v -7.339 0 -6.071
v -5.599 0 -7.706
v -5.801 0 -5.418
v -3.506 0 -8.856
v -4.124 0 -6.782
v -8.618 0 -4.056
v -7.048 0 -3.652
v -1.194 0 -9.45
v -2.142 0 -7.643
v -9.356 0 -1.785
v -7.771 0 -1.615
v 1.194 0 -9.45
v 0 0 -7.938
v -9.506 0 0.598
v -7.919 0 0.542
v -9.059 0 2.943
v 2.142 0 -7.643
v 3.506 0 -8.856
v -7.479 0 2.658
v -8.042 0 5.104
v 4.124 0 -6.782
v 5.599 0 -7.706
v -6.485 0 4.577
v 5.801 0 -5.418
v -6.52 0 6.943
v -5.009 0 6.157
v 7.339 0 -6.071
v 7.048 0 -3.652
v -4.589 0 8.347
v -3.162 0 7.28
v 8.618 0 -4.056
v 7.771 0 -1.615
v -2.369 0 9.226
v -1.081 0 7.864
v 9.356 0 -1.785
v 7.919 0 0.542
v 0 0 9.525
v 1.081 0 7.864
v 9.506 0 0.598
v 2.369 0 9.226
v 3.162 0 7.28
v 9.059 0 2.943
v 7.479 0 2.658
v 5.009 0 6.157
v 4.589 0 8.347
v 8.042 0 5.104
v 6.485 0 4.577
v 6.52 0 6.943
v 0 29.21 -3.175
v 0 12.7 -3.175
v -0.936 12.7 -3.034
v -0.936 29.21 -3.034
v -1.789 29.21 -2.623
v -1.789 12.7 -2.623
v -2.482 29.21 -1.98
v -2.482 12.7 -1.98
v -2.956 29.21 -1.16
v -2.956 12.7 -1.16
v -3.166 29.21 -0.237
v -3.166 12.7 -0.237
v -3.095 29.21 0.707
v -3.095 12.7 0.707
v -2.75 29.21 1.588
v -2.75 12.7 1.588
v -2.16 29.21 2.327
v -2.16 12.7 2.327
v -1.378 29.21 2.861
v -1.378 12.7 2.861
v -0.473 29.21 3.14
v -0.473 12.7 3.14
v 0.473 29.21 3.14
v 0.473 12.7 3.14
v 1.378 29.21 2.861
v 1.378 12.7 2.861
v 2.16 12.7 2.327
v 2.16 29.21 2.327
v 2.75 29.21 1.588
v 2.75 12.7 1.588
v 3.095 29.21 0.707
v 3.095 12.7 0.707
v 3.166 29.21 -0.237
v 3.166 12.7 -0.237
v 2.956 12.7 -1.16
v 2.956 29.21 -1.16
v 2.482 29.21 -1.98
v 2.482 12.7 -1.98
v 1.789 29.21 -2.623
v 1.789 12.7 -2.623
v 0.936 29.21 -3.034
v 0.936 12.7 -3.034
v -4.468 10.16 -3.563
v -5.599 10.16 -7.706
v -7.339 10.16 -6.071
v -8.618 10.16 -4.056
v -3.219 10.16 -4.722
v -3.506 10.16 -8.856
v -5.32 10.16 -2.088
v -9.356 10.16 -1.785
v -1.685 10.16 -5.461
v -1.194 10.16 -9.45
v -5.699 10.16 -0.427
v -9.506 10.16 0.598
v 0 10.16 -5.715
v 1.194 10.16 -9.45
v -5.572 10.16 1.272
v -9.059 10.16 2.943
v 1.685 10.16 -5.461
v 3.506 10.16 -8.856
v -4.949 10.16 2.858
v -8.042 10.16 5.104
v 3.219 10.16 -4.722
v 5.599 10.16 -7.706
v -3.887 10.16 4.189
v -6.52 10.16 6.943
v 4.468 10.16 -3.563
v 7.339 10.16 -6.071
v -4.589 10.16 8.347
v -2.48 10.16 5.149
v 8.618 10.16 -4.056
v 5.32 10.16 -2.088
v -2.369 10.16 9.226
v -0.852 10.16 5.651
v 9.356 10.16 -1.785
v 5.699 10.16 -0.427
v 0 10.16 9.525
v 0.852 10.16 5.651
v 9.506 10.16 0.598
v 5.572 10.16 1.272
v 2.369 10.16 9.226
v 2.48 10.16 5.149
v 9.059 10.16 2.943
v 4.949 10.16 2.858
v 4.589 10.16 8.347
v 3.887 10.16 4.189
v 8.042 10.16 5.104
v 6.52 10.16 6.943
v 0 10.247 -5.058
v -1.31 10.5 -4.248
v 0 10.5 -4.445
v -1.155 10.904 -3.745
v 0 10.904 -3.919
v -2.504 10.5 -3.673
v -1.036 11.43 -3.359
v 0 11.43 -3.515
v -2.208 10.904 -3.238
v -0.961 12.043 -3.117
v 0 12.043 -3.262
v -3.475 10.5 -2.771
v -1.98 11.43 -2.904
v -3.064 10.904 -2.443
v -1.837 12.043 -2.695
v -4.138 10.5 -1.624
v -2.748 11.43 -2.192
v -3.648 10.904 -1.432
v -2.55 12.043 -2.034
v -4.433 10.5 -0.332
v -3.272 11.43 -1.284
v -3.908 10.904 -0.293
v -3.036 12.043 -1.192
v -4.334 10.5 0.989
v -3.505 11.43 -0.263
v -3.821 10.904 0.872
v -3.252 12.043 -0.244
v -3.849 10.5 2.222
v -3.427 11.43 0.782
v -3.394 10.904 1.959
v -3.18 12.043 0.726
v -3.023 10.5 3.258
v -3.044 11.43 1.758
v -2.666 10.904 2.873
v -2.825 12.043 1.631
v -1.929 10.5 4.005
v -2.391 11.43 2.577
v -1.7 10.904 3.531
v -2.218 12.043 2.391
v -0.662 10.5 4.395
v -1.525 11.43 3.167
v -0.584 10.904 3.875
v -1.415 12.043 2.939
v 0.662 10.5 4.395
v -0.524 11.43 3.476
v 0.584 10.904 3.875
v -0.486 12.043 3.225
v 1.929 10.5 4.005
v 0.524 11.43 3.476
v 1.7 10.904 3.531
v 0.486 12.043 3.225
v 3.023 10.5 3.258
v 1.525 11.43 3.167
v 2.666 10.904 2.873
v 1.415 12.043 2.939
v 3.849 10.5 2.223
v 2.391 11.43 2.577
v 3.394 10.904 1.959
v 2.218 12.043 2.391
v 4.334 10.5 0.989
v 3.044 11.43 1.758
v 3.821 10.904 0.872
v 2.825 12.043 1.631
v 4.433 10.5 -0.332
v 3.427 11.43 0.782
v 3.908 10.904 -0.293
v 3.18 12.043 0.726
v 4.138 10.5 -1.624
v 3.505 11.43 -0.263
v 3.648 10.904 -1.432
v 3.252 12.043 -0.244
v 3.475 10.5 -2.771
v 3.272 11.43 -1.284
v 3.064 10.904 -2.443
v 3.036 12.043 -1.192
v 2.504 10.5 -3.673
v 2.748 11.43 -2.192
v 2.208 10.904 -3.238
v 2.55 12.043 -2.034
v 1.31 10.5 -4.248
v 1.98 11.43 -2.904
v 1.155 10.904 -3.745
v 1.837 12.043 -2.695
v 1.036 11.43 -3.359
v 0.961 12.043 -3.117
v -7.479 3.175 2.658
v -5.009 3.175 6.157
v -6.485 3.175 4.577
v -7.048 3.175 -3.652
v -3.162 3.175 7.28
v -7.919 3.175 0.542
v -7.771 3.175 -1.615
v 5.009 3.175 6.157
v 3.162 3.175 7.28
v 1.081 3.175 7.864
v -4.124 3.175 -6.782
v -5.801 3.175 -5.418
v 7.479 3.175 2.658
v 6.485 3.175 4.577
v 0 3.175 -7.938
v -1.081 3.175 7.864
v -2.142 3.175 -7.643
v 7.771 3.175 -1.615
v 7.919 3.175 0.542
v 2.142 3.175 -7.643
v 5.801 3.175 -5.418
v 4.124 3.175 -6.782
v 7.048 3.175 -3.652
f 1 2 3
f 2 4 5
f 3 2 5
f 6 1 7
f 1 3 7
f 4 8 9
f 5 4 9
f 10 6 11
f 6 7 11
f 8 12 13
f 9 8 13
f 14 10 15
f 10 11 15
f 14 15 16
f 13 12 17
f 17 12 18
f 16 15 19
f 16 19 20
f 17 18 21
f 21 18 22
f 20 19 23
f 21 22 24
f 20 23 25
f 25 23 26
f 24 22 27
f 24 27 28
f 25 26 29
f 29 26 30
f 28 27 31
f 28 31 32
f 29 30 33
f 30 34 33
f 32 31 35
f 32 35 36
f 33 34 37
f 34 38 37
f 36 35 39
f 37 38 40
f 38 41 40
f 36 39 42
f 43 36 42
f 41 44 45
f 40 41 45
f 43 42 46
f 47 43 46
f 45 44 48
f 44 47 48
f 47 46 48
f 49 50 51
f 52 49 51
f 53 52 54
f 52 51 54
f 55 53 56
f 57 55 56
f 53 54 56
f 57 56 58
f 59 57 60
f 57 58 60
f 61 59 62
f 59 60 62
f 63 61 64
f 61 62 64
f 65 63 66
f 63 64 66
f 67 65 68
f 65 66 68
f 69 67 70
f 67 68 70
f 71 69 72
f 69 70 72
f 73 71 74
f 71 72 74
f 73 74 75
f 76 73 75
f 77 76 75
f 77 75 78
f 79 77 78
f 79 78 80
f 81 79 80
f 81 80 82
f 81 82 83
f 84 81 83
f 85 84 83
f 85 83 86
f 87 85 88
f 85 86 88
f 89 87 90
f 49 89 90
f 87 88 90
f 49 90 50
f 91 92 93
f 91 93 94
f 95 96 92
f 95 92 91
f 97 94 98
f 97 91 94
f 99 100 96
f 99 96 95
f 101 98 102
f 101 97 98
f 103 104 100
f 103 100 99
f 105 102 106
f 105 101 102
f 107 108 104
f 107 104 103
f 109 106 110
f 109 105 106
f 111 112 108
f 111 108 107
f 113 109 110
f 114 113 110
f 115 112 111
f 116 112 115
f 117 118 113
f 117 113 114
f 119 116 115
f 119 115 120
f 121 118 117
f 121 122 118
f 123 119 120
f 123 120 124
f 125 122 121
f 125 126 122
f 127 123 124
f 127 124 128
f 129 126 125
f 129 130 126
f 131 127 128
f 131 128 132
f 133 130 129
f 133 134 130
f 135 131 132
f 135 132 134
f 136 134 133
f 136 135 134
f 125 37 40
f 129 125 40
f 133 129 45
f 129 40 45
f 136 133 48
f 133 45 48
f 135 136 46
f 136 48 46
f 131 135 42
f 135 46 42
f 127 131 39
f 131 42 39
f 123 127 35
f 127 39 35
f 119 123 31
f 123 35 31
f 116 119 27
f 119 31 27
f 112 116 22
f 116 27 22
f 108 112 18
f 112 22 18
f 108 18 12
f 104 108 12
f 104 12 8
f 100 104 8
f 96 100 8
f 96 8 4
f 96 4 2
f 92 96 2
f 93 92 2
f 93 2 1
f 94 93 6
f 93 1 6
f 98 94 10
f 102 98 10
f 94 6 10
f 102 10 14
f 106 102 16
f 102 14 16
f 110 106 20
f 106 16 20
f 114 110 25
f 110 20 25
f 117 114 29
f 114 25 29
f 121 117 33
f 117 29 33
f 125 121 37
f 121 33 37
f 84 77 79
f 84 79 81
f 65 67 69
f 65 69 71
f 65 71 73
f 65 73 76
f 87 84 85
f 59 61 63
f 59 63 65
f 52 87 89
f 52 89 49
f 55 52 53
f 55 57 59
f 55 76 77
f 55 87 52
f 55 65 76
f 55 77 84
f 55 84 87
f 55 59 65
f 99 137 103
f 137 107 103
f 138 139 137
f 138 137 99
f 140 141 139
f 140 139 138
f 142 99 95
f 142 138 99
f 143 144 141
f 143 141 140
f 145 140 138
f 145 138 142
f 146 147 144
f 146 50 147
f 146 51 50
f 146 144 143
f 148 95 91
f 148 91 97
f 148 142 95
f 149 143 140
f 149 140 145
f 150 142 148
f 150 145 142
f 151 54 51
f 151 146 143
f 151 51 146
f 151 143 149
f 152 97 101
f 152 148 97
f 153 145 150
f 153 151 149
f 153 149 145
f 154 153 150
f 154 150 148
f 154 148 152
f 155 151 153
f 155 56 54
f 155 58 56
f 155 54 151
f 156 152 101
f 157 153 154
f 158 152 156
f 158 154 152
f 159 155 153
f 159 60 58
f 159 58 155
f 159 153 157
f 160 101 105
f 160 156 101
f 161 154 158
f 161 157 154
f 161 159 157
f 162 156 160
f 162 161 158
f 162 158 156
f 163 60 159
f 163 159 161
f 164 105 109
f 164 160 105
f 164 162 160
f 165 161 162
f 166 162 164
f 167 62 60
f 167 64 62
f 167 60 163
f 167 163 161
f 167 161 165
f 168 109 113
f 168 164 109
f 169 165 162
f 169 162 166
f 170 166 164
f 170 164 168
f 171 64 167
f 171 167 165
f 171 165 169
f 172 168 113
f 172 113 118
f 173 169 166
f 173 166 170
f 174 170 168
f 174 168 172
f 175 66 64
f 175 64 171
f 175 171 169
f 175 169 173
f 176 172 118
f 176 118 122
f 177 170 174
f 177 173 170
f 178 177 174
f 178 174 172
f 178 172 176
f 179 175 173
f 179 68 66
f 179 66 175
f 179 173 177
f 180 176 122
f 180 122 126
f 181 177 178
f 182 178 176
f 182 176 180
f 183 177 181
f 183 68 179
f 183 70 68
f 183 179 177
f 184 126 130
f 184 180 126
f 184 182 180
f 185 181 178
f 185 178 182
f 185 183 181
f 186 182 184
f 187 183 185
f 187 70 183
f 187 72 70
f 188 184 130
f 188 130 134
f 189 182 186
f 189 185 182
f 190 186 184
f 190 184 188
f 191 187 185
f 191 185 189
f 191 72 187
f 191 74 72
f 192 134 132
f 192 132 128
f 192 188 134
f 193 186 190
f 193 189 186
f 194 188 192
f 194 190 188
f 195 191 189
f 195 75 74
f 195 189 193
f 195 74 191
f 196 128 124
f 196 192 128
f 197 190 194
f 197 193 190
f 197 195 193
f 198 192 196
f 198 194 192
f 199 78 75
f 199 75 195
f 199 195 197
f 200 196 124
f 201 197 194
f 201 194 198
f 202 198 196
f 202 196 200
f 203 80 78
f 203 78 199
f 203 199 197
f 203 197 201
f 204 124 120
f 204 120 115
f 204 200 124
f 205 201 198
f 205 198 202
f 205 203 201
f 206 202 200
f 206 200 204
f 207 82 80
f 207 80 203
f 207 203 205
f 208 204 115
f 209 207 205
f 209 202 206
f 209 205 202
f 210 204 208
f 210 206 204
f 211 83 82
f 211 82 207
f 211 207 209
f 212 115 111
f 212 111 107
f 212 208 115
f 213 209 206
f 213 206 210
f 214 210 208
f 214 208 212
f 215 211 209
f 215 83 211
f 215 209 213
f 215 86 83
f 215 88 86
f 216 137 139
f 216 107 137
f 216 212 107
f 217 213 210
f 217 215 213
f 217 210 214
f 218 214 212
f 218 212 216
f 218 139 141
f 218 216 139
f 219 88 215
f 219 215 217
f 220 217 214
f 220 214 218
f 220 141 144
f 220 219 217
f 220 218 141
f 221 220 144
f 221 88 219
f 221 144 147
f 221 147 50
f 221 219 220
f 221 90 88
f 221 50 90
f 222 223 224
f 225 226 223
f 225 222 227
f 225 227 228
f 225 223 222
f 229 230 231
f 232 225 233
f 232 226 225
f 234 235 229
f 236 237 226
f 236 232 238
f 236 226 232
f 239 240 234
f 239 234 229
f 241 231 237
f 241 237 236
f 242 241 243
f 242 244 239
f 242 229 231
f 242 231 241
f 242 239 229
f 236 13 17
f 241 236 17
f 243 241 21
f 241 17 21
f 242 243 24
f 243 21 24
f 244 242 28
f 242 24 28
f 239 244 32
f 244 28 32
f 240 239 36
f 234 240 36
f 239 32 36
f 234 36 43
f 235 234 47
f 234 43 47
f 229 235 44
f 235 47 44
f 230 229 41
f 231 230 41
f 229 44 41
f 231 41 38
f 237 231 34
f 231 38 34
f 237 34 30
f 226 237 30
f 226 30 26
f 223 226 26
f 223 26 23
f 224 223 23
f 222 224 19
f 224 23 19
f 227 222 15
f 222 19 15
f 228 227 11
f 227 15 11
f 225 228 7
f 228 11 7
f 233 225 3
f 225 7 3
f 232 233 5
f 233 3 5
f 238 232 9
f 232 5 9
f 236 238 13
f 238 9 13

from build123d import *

# Parameters (mm, degrees)
SKETCH1_R           = 9.525
BOSS_EXTRUDE1_DEPTH = 10.16
SKETCH2_R           = 7.9375
CUT_EXTRUDE1_DEPTH  = 3.175
SKETCH3_R           = 3.175
BOSS_EXTRUDE2_DEPTH = 19.05
FILLET1_R           = 2.54


with BuildPart() as part:
    # Sketch1 → Boss-Extrude1 (new body)
    with BuildSketch(Plane(origin=(0, 0, 0), x_dir=(1, 0, 0), z_dir=(0, 1, 0))):
        with Locations(Location((0, 0, 0), (0, 0, 270))):
            Circle(SKETCH1_R)
    extrude(amount=BOSS_EXTRUDE1_DEPTH)

    # Sketch2 → Cut-Extrude1 (cut)
    with BuildSketch(Plane(origin=(0, 0, 0), x_dir=(-1, 0, 0), z_dir=(0, -1, 0))):
        with Locations(Location((0, 0, 0), (0, 0, 90))):
            Circle(SKETCH2_R)
    extrude(amount=-CUT_EXTRUDE1_DEPTH, mode=Mode.SUBTRACT)

    # Sketch3 → Boss-Extrude2 (add)
    with BuildSketch(Plane(origin=(0, 10.16, 0), x_dir=(1, 0, 0), z_dir=(0, 1, 0))):
        with Locations(Location((0, 0, 0), (0, 0, 90))):
            Circle(SKETCH3_R)
    extrude(amount=BOSS_EXTRUDE2_DEPTH)

    # Fillet1
    fillet1_edges = [part.edges().sort_by_distance(p)[0] for p in [
        (0, 10.16, 3.175),
    ]]
    fillet(fillet1_edges, radius=FILLET1_R)


solid = part.part
